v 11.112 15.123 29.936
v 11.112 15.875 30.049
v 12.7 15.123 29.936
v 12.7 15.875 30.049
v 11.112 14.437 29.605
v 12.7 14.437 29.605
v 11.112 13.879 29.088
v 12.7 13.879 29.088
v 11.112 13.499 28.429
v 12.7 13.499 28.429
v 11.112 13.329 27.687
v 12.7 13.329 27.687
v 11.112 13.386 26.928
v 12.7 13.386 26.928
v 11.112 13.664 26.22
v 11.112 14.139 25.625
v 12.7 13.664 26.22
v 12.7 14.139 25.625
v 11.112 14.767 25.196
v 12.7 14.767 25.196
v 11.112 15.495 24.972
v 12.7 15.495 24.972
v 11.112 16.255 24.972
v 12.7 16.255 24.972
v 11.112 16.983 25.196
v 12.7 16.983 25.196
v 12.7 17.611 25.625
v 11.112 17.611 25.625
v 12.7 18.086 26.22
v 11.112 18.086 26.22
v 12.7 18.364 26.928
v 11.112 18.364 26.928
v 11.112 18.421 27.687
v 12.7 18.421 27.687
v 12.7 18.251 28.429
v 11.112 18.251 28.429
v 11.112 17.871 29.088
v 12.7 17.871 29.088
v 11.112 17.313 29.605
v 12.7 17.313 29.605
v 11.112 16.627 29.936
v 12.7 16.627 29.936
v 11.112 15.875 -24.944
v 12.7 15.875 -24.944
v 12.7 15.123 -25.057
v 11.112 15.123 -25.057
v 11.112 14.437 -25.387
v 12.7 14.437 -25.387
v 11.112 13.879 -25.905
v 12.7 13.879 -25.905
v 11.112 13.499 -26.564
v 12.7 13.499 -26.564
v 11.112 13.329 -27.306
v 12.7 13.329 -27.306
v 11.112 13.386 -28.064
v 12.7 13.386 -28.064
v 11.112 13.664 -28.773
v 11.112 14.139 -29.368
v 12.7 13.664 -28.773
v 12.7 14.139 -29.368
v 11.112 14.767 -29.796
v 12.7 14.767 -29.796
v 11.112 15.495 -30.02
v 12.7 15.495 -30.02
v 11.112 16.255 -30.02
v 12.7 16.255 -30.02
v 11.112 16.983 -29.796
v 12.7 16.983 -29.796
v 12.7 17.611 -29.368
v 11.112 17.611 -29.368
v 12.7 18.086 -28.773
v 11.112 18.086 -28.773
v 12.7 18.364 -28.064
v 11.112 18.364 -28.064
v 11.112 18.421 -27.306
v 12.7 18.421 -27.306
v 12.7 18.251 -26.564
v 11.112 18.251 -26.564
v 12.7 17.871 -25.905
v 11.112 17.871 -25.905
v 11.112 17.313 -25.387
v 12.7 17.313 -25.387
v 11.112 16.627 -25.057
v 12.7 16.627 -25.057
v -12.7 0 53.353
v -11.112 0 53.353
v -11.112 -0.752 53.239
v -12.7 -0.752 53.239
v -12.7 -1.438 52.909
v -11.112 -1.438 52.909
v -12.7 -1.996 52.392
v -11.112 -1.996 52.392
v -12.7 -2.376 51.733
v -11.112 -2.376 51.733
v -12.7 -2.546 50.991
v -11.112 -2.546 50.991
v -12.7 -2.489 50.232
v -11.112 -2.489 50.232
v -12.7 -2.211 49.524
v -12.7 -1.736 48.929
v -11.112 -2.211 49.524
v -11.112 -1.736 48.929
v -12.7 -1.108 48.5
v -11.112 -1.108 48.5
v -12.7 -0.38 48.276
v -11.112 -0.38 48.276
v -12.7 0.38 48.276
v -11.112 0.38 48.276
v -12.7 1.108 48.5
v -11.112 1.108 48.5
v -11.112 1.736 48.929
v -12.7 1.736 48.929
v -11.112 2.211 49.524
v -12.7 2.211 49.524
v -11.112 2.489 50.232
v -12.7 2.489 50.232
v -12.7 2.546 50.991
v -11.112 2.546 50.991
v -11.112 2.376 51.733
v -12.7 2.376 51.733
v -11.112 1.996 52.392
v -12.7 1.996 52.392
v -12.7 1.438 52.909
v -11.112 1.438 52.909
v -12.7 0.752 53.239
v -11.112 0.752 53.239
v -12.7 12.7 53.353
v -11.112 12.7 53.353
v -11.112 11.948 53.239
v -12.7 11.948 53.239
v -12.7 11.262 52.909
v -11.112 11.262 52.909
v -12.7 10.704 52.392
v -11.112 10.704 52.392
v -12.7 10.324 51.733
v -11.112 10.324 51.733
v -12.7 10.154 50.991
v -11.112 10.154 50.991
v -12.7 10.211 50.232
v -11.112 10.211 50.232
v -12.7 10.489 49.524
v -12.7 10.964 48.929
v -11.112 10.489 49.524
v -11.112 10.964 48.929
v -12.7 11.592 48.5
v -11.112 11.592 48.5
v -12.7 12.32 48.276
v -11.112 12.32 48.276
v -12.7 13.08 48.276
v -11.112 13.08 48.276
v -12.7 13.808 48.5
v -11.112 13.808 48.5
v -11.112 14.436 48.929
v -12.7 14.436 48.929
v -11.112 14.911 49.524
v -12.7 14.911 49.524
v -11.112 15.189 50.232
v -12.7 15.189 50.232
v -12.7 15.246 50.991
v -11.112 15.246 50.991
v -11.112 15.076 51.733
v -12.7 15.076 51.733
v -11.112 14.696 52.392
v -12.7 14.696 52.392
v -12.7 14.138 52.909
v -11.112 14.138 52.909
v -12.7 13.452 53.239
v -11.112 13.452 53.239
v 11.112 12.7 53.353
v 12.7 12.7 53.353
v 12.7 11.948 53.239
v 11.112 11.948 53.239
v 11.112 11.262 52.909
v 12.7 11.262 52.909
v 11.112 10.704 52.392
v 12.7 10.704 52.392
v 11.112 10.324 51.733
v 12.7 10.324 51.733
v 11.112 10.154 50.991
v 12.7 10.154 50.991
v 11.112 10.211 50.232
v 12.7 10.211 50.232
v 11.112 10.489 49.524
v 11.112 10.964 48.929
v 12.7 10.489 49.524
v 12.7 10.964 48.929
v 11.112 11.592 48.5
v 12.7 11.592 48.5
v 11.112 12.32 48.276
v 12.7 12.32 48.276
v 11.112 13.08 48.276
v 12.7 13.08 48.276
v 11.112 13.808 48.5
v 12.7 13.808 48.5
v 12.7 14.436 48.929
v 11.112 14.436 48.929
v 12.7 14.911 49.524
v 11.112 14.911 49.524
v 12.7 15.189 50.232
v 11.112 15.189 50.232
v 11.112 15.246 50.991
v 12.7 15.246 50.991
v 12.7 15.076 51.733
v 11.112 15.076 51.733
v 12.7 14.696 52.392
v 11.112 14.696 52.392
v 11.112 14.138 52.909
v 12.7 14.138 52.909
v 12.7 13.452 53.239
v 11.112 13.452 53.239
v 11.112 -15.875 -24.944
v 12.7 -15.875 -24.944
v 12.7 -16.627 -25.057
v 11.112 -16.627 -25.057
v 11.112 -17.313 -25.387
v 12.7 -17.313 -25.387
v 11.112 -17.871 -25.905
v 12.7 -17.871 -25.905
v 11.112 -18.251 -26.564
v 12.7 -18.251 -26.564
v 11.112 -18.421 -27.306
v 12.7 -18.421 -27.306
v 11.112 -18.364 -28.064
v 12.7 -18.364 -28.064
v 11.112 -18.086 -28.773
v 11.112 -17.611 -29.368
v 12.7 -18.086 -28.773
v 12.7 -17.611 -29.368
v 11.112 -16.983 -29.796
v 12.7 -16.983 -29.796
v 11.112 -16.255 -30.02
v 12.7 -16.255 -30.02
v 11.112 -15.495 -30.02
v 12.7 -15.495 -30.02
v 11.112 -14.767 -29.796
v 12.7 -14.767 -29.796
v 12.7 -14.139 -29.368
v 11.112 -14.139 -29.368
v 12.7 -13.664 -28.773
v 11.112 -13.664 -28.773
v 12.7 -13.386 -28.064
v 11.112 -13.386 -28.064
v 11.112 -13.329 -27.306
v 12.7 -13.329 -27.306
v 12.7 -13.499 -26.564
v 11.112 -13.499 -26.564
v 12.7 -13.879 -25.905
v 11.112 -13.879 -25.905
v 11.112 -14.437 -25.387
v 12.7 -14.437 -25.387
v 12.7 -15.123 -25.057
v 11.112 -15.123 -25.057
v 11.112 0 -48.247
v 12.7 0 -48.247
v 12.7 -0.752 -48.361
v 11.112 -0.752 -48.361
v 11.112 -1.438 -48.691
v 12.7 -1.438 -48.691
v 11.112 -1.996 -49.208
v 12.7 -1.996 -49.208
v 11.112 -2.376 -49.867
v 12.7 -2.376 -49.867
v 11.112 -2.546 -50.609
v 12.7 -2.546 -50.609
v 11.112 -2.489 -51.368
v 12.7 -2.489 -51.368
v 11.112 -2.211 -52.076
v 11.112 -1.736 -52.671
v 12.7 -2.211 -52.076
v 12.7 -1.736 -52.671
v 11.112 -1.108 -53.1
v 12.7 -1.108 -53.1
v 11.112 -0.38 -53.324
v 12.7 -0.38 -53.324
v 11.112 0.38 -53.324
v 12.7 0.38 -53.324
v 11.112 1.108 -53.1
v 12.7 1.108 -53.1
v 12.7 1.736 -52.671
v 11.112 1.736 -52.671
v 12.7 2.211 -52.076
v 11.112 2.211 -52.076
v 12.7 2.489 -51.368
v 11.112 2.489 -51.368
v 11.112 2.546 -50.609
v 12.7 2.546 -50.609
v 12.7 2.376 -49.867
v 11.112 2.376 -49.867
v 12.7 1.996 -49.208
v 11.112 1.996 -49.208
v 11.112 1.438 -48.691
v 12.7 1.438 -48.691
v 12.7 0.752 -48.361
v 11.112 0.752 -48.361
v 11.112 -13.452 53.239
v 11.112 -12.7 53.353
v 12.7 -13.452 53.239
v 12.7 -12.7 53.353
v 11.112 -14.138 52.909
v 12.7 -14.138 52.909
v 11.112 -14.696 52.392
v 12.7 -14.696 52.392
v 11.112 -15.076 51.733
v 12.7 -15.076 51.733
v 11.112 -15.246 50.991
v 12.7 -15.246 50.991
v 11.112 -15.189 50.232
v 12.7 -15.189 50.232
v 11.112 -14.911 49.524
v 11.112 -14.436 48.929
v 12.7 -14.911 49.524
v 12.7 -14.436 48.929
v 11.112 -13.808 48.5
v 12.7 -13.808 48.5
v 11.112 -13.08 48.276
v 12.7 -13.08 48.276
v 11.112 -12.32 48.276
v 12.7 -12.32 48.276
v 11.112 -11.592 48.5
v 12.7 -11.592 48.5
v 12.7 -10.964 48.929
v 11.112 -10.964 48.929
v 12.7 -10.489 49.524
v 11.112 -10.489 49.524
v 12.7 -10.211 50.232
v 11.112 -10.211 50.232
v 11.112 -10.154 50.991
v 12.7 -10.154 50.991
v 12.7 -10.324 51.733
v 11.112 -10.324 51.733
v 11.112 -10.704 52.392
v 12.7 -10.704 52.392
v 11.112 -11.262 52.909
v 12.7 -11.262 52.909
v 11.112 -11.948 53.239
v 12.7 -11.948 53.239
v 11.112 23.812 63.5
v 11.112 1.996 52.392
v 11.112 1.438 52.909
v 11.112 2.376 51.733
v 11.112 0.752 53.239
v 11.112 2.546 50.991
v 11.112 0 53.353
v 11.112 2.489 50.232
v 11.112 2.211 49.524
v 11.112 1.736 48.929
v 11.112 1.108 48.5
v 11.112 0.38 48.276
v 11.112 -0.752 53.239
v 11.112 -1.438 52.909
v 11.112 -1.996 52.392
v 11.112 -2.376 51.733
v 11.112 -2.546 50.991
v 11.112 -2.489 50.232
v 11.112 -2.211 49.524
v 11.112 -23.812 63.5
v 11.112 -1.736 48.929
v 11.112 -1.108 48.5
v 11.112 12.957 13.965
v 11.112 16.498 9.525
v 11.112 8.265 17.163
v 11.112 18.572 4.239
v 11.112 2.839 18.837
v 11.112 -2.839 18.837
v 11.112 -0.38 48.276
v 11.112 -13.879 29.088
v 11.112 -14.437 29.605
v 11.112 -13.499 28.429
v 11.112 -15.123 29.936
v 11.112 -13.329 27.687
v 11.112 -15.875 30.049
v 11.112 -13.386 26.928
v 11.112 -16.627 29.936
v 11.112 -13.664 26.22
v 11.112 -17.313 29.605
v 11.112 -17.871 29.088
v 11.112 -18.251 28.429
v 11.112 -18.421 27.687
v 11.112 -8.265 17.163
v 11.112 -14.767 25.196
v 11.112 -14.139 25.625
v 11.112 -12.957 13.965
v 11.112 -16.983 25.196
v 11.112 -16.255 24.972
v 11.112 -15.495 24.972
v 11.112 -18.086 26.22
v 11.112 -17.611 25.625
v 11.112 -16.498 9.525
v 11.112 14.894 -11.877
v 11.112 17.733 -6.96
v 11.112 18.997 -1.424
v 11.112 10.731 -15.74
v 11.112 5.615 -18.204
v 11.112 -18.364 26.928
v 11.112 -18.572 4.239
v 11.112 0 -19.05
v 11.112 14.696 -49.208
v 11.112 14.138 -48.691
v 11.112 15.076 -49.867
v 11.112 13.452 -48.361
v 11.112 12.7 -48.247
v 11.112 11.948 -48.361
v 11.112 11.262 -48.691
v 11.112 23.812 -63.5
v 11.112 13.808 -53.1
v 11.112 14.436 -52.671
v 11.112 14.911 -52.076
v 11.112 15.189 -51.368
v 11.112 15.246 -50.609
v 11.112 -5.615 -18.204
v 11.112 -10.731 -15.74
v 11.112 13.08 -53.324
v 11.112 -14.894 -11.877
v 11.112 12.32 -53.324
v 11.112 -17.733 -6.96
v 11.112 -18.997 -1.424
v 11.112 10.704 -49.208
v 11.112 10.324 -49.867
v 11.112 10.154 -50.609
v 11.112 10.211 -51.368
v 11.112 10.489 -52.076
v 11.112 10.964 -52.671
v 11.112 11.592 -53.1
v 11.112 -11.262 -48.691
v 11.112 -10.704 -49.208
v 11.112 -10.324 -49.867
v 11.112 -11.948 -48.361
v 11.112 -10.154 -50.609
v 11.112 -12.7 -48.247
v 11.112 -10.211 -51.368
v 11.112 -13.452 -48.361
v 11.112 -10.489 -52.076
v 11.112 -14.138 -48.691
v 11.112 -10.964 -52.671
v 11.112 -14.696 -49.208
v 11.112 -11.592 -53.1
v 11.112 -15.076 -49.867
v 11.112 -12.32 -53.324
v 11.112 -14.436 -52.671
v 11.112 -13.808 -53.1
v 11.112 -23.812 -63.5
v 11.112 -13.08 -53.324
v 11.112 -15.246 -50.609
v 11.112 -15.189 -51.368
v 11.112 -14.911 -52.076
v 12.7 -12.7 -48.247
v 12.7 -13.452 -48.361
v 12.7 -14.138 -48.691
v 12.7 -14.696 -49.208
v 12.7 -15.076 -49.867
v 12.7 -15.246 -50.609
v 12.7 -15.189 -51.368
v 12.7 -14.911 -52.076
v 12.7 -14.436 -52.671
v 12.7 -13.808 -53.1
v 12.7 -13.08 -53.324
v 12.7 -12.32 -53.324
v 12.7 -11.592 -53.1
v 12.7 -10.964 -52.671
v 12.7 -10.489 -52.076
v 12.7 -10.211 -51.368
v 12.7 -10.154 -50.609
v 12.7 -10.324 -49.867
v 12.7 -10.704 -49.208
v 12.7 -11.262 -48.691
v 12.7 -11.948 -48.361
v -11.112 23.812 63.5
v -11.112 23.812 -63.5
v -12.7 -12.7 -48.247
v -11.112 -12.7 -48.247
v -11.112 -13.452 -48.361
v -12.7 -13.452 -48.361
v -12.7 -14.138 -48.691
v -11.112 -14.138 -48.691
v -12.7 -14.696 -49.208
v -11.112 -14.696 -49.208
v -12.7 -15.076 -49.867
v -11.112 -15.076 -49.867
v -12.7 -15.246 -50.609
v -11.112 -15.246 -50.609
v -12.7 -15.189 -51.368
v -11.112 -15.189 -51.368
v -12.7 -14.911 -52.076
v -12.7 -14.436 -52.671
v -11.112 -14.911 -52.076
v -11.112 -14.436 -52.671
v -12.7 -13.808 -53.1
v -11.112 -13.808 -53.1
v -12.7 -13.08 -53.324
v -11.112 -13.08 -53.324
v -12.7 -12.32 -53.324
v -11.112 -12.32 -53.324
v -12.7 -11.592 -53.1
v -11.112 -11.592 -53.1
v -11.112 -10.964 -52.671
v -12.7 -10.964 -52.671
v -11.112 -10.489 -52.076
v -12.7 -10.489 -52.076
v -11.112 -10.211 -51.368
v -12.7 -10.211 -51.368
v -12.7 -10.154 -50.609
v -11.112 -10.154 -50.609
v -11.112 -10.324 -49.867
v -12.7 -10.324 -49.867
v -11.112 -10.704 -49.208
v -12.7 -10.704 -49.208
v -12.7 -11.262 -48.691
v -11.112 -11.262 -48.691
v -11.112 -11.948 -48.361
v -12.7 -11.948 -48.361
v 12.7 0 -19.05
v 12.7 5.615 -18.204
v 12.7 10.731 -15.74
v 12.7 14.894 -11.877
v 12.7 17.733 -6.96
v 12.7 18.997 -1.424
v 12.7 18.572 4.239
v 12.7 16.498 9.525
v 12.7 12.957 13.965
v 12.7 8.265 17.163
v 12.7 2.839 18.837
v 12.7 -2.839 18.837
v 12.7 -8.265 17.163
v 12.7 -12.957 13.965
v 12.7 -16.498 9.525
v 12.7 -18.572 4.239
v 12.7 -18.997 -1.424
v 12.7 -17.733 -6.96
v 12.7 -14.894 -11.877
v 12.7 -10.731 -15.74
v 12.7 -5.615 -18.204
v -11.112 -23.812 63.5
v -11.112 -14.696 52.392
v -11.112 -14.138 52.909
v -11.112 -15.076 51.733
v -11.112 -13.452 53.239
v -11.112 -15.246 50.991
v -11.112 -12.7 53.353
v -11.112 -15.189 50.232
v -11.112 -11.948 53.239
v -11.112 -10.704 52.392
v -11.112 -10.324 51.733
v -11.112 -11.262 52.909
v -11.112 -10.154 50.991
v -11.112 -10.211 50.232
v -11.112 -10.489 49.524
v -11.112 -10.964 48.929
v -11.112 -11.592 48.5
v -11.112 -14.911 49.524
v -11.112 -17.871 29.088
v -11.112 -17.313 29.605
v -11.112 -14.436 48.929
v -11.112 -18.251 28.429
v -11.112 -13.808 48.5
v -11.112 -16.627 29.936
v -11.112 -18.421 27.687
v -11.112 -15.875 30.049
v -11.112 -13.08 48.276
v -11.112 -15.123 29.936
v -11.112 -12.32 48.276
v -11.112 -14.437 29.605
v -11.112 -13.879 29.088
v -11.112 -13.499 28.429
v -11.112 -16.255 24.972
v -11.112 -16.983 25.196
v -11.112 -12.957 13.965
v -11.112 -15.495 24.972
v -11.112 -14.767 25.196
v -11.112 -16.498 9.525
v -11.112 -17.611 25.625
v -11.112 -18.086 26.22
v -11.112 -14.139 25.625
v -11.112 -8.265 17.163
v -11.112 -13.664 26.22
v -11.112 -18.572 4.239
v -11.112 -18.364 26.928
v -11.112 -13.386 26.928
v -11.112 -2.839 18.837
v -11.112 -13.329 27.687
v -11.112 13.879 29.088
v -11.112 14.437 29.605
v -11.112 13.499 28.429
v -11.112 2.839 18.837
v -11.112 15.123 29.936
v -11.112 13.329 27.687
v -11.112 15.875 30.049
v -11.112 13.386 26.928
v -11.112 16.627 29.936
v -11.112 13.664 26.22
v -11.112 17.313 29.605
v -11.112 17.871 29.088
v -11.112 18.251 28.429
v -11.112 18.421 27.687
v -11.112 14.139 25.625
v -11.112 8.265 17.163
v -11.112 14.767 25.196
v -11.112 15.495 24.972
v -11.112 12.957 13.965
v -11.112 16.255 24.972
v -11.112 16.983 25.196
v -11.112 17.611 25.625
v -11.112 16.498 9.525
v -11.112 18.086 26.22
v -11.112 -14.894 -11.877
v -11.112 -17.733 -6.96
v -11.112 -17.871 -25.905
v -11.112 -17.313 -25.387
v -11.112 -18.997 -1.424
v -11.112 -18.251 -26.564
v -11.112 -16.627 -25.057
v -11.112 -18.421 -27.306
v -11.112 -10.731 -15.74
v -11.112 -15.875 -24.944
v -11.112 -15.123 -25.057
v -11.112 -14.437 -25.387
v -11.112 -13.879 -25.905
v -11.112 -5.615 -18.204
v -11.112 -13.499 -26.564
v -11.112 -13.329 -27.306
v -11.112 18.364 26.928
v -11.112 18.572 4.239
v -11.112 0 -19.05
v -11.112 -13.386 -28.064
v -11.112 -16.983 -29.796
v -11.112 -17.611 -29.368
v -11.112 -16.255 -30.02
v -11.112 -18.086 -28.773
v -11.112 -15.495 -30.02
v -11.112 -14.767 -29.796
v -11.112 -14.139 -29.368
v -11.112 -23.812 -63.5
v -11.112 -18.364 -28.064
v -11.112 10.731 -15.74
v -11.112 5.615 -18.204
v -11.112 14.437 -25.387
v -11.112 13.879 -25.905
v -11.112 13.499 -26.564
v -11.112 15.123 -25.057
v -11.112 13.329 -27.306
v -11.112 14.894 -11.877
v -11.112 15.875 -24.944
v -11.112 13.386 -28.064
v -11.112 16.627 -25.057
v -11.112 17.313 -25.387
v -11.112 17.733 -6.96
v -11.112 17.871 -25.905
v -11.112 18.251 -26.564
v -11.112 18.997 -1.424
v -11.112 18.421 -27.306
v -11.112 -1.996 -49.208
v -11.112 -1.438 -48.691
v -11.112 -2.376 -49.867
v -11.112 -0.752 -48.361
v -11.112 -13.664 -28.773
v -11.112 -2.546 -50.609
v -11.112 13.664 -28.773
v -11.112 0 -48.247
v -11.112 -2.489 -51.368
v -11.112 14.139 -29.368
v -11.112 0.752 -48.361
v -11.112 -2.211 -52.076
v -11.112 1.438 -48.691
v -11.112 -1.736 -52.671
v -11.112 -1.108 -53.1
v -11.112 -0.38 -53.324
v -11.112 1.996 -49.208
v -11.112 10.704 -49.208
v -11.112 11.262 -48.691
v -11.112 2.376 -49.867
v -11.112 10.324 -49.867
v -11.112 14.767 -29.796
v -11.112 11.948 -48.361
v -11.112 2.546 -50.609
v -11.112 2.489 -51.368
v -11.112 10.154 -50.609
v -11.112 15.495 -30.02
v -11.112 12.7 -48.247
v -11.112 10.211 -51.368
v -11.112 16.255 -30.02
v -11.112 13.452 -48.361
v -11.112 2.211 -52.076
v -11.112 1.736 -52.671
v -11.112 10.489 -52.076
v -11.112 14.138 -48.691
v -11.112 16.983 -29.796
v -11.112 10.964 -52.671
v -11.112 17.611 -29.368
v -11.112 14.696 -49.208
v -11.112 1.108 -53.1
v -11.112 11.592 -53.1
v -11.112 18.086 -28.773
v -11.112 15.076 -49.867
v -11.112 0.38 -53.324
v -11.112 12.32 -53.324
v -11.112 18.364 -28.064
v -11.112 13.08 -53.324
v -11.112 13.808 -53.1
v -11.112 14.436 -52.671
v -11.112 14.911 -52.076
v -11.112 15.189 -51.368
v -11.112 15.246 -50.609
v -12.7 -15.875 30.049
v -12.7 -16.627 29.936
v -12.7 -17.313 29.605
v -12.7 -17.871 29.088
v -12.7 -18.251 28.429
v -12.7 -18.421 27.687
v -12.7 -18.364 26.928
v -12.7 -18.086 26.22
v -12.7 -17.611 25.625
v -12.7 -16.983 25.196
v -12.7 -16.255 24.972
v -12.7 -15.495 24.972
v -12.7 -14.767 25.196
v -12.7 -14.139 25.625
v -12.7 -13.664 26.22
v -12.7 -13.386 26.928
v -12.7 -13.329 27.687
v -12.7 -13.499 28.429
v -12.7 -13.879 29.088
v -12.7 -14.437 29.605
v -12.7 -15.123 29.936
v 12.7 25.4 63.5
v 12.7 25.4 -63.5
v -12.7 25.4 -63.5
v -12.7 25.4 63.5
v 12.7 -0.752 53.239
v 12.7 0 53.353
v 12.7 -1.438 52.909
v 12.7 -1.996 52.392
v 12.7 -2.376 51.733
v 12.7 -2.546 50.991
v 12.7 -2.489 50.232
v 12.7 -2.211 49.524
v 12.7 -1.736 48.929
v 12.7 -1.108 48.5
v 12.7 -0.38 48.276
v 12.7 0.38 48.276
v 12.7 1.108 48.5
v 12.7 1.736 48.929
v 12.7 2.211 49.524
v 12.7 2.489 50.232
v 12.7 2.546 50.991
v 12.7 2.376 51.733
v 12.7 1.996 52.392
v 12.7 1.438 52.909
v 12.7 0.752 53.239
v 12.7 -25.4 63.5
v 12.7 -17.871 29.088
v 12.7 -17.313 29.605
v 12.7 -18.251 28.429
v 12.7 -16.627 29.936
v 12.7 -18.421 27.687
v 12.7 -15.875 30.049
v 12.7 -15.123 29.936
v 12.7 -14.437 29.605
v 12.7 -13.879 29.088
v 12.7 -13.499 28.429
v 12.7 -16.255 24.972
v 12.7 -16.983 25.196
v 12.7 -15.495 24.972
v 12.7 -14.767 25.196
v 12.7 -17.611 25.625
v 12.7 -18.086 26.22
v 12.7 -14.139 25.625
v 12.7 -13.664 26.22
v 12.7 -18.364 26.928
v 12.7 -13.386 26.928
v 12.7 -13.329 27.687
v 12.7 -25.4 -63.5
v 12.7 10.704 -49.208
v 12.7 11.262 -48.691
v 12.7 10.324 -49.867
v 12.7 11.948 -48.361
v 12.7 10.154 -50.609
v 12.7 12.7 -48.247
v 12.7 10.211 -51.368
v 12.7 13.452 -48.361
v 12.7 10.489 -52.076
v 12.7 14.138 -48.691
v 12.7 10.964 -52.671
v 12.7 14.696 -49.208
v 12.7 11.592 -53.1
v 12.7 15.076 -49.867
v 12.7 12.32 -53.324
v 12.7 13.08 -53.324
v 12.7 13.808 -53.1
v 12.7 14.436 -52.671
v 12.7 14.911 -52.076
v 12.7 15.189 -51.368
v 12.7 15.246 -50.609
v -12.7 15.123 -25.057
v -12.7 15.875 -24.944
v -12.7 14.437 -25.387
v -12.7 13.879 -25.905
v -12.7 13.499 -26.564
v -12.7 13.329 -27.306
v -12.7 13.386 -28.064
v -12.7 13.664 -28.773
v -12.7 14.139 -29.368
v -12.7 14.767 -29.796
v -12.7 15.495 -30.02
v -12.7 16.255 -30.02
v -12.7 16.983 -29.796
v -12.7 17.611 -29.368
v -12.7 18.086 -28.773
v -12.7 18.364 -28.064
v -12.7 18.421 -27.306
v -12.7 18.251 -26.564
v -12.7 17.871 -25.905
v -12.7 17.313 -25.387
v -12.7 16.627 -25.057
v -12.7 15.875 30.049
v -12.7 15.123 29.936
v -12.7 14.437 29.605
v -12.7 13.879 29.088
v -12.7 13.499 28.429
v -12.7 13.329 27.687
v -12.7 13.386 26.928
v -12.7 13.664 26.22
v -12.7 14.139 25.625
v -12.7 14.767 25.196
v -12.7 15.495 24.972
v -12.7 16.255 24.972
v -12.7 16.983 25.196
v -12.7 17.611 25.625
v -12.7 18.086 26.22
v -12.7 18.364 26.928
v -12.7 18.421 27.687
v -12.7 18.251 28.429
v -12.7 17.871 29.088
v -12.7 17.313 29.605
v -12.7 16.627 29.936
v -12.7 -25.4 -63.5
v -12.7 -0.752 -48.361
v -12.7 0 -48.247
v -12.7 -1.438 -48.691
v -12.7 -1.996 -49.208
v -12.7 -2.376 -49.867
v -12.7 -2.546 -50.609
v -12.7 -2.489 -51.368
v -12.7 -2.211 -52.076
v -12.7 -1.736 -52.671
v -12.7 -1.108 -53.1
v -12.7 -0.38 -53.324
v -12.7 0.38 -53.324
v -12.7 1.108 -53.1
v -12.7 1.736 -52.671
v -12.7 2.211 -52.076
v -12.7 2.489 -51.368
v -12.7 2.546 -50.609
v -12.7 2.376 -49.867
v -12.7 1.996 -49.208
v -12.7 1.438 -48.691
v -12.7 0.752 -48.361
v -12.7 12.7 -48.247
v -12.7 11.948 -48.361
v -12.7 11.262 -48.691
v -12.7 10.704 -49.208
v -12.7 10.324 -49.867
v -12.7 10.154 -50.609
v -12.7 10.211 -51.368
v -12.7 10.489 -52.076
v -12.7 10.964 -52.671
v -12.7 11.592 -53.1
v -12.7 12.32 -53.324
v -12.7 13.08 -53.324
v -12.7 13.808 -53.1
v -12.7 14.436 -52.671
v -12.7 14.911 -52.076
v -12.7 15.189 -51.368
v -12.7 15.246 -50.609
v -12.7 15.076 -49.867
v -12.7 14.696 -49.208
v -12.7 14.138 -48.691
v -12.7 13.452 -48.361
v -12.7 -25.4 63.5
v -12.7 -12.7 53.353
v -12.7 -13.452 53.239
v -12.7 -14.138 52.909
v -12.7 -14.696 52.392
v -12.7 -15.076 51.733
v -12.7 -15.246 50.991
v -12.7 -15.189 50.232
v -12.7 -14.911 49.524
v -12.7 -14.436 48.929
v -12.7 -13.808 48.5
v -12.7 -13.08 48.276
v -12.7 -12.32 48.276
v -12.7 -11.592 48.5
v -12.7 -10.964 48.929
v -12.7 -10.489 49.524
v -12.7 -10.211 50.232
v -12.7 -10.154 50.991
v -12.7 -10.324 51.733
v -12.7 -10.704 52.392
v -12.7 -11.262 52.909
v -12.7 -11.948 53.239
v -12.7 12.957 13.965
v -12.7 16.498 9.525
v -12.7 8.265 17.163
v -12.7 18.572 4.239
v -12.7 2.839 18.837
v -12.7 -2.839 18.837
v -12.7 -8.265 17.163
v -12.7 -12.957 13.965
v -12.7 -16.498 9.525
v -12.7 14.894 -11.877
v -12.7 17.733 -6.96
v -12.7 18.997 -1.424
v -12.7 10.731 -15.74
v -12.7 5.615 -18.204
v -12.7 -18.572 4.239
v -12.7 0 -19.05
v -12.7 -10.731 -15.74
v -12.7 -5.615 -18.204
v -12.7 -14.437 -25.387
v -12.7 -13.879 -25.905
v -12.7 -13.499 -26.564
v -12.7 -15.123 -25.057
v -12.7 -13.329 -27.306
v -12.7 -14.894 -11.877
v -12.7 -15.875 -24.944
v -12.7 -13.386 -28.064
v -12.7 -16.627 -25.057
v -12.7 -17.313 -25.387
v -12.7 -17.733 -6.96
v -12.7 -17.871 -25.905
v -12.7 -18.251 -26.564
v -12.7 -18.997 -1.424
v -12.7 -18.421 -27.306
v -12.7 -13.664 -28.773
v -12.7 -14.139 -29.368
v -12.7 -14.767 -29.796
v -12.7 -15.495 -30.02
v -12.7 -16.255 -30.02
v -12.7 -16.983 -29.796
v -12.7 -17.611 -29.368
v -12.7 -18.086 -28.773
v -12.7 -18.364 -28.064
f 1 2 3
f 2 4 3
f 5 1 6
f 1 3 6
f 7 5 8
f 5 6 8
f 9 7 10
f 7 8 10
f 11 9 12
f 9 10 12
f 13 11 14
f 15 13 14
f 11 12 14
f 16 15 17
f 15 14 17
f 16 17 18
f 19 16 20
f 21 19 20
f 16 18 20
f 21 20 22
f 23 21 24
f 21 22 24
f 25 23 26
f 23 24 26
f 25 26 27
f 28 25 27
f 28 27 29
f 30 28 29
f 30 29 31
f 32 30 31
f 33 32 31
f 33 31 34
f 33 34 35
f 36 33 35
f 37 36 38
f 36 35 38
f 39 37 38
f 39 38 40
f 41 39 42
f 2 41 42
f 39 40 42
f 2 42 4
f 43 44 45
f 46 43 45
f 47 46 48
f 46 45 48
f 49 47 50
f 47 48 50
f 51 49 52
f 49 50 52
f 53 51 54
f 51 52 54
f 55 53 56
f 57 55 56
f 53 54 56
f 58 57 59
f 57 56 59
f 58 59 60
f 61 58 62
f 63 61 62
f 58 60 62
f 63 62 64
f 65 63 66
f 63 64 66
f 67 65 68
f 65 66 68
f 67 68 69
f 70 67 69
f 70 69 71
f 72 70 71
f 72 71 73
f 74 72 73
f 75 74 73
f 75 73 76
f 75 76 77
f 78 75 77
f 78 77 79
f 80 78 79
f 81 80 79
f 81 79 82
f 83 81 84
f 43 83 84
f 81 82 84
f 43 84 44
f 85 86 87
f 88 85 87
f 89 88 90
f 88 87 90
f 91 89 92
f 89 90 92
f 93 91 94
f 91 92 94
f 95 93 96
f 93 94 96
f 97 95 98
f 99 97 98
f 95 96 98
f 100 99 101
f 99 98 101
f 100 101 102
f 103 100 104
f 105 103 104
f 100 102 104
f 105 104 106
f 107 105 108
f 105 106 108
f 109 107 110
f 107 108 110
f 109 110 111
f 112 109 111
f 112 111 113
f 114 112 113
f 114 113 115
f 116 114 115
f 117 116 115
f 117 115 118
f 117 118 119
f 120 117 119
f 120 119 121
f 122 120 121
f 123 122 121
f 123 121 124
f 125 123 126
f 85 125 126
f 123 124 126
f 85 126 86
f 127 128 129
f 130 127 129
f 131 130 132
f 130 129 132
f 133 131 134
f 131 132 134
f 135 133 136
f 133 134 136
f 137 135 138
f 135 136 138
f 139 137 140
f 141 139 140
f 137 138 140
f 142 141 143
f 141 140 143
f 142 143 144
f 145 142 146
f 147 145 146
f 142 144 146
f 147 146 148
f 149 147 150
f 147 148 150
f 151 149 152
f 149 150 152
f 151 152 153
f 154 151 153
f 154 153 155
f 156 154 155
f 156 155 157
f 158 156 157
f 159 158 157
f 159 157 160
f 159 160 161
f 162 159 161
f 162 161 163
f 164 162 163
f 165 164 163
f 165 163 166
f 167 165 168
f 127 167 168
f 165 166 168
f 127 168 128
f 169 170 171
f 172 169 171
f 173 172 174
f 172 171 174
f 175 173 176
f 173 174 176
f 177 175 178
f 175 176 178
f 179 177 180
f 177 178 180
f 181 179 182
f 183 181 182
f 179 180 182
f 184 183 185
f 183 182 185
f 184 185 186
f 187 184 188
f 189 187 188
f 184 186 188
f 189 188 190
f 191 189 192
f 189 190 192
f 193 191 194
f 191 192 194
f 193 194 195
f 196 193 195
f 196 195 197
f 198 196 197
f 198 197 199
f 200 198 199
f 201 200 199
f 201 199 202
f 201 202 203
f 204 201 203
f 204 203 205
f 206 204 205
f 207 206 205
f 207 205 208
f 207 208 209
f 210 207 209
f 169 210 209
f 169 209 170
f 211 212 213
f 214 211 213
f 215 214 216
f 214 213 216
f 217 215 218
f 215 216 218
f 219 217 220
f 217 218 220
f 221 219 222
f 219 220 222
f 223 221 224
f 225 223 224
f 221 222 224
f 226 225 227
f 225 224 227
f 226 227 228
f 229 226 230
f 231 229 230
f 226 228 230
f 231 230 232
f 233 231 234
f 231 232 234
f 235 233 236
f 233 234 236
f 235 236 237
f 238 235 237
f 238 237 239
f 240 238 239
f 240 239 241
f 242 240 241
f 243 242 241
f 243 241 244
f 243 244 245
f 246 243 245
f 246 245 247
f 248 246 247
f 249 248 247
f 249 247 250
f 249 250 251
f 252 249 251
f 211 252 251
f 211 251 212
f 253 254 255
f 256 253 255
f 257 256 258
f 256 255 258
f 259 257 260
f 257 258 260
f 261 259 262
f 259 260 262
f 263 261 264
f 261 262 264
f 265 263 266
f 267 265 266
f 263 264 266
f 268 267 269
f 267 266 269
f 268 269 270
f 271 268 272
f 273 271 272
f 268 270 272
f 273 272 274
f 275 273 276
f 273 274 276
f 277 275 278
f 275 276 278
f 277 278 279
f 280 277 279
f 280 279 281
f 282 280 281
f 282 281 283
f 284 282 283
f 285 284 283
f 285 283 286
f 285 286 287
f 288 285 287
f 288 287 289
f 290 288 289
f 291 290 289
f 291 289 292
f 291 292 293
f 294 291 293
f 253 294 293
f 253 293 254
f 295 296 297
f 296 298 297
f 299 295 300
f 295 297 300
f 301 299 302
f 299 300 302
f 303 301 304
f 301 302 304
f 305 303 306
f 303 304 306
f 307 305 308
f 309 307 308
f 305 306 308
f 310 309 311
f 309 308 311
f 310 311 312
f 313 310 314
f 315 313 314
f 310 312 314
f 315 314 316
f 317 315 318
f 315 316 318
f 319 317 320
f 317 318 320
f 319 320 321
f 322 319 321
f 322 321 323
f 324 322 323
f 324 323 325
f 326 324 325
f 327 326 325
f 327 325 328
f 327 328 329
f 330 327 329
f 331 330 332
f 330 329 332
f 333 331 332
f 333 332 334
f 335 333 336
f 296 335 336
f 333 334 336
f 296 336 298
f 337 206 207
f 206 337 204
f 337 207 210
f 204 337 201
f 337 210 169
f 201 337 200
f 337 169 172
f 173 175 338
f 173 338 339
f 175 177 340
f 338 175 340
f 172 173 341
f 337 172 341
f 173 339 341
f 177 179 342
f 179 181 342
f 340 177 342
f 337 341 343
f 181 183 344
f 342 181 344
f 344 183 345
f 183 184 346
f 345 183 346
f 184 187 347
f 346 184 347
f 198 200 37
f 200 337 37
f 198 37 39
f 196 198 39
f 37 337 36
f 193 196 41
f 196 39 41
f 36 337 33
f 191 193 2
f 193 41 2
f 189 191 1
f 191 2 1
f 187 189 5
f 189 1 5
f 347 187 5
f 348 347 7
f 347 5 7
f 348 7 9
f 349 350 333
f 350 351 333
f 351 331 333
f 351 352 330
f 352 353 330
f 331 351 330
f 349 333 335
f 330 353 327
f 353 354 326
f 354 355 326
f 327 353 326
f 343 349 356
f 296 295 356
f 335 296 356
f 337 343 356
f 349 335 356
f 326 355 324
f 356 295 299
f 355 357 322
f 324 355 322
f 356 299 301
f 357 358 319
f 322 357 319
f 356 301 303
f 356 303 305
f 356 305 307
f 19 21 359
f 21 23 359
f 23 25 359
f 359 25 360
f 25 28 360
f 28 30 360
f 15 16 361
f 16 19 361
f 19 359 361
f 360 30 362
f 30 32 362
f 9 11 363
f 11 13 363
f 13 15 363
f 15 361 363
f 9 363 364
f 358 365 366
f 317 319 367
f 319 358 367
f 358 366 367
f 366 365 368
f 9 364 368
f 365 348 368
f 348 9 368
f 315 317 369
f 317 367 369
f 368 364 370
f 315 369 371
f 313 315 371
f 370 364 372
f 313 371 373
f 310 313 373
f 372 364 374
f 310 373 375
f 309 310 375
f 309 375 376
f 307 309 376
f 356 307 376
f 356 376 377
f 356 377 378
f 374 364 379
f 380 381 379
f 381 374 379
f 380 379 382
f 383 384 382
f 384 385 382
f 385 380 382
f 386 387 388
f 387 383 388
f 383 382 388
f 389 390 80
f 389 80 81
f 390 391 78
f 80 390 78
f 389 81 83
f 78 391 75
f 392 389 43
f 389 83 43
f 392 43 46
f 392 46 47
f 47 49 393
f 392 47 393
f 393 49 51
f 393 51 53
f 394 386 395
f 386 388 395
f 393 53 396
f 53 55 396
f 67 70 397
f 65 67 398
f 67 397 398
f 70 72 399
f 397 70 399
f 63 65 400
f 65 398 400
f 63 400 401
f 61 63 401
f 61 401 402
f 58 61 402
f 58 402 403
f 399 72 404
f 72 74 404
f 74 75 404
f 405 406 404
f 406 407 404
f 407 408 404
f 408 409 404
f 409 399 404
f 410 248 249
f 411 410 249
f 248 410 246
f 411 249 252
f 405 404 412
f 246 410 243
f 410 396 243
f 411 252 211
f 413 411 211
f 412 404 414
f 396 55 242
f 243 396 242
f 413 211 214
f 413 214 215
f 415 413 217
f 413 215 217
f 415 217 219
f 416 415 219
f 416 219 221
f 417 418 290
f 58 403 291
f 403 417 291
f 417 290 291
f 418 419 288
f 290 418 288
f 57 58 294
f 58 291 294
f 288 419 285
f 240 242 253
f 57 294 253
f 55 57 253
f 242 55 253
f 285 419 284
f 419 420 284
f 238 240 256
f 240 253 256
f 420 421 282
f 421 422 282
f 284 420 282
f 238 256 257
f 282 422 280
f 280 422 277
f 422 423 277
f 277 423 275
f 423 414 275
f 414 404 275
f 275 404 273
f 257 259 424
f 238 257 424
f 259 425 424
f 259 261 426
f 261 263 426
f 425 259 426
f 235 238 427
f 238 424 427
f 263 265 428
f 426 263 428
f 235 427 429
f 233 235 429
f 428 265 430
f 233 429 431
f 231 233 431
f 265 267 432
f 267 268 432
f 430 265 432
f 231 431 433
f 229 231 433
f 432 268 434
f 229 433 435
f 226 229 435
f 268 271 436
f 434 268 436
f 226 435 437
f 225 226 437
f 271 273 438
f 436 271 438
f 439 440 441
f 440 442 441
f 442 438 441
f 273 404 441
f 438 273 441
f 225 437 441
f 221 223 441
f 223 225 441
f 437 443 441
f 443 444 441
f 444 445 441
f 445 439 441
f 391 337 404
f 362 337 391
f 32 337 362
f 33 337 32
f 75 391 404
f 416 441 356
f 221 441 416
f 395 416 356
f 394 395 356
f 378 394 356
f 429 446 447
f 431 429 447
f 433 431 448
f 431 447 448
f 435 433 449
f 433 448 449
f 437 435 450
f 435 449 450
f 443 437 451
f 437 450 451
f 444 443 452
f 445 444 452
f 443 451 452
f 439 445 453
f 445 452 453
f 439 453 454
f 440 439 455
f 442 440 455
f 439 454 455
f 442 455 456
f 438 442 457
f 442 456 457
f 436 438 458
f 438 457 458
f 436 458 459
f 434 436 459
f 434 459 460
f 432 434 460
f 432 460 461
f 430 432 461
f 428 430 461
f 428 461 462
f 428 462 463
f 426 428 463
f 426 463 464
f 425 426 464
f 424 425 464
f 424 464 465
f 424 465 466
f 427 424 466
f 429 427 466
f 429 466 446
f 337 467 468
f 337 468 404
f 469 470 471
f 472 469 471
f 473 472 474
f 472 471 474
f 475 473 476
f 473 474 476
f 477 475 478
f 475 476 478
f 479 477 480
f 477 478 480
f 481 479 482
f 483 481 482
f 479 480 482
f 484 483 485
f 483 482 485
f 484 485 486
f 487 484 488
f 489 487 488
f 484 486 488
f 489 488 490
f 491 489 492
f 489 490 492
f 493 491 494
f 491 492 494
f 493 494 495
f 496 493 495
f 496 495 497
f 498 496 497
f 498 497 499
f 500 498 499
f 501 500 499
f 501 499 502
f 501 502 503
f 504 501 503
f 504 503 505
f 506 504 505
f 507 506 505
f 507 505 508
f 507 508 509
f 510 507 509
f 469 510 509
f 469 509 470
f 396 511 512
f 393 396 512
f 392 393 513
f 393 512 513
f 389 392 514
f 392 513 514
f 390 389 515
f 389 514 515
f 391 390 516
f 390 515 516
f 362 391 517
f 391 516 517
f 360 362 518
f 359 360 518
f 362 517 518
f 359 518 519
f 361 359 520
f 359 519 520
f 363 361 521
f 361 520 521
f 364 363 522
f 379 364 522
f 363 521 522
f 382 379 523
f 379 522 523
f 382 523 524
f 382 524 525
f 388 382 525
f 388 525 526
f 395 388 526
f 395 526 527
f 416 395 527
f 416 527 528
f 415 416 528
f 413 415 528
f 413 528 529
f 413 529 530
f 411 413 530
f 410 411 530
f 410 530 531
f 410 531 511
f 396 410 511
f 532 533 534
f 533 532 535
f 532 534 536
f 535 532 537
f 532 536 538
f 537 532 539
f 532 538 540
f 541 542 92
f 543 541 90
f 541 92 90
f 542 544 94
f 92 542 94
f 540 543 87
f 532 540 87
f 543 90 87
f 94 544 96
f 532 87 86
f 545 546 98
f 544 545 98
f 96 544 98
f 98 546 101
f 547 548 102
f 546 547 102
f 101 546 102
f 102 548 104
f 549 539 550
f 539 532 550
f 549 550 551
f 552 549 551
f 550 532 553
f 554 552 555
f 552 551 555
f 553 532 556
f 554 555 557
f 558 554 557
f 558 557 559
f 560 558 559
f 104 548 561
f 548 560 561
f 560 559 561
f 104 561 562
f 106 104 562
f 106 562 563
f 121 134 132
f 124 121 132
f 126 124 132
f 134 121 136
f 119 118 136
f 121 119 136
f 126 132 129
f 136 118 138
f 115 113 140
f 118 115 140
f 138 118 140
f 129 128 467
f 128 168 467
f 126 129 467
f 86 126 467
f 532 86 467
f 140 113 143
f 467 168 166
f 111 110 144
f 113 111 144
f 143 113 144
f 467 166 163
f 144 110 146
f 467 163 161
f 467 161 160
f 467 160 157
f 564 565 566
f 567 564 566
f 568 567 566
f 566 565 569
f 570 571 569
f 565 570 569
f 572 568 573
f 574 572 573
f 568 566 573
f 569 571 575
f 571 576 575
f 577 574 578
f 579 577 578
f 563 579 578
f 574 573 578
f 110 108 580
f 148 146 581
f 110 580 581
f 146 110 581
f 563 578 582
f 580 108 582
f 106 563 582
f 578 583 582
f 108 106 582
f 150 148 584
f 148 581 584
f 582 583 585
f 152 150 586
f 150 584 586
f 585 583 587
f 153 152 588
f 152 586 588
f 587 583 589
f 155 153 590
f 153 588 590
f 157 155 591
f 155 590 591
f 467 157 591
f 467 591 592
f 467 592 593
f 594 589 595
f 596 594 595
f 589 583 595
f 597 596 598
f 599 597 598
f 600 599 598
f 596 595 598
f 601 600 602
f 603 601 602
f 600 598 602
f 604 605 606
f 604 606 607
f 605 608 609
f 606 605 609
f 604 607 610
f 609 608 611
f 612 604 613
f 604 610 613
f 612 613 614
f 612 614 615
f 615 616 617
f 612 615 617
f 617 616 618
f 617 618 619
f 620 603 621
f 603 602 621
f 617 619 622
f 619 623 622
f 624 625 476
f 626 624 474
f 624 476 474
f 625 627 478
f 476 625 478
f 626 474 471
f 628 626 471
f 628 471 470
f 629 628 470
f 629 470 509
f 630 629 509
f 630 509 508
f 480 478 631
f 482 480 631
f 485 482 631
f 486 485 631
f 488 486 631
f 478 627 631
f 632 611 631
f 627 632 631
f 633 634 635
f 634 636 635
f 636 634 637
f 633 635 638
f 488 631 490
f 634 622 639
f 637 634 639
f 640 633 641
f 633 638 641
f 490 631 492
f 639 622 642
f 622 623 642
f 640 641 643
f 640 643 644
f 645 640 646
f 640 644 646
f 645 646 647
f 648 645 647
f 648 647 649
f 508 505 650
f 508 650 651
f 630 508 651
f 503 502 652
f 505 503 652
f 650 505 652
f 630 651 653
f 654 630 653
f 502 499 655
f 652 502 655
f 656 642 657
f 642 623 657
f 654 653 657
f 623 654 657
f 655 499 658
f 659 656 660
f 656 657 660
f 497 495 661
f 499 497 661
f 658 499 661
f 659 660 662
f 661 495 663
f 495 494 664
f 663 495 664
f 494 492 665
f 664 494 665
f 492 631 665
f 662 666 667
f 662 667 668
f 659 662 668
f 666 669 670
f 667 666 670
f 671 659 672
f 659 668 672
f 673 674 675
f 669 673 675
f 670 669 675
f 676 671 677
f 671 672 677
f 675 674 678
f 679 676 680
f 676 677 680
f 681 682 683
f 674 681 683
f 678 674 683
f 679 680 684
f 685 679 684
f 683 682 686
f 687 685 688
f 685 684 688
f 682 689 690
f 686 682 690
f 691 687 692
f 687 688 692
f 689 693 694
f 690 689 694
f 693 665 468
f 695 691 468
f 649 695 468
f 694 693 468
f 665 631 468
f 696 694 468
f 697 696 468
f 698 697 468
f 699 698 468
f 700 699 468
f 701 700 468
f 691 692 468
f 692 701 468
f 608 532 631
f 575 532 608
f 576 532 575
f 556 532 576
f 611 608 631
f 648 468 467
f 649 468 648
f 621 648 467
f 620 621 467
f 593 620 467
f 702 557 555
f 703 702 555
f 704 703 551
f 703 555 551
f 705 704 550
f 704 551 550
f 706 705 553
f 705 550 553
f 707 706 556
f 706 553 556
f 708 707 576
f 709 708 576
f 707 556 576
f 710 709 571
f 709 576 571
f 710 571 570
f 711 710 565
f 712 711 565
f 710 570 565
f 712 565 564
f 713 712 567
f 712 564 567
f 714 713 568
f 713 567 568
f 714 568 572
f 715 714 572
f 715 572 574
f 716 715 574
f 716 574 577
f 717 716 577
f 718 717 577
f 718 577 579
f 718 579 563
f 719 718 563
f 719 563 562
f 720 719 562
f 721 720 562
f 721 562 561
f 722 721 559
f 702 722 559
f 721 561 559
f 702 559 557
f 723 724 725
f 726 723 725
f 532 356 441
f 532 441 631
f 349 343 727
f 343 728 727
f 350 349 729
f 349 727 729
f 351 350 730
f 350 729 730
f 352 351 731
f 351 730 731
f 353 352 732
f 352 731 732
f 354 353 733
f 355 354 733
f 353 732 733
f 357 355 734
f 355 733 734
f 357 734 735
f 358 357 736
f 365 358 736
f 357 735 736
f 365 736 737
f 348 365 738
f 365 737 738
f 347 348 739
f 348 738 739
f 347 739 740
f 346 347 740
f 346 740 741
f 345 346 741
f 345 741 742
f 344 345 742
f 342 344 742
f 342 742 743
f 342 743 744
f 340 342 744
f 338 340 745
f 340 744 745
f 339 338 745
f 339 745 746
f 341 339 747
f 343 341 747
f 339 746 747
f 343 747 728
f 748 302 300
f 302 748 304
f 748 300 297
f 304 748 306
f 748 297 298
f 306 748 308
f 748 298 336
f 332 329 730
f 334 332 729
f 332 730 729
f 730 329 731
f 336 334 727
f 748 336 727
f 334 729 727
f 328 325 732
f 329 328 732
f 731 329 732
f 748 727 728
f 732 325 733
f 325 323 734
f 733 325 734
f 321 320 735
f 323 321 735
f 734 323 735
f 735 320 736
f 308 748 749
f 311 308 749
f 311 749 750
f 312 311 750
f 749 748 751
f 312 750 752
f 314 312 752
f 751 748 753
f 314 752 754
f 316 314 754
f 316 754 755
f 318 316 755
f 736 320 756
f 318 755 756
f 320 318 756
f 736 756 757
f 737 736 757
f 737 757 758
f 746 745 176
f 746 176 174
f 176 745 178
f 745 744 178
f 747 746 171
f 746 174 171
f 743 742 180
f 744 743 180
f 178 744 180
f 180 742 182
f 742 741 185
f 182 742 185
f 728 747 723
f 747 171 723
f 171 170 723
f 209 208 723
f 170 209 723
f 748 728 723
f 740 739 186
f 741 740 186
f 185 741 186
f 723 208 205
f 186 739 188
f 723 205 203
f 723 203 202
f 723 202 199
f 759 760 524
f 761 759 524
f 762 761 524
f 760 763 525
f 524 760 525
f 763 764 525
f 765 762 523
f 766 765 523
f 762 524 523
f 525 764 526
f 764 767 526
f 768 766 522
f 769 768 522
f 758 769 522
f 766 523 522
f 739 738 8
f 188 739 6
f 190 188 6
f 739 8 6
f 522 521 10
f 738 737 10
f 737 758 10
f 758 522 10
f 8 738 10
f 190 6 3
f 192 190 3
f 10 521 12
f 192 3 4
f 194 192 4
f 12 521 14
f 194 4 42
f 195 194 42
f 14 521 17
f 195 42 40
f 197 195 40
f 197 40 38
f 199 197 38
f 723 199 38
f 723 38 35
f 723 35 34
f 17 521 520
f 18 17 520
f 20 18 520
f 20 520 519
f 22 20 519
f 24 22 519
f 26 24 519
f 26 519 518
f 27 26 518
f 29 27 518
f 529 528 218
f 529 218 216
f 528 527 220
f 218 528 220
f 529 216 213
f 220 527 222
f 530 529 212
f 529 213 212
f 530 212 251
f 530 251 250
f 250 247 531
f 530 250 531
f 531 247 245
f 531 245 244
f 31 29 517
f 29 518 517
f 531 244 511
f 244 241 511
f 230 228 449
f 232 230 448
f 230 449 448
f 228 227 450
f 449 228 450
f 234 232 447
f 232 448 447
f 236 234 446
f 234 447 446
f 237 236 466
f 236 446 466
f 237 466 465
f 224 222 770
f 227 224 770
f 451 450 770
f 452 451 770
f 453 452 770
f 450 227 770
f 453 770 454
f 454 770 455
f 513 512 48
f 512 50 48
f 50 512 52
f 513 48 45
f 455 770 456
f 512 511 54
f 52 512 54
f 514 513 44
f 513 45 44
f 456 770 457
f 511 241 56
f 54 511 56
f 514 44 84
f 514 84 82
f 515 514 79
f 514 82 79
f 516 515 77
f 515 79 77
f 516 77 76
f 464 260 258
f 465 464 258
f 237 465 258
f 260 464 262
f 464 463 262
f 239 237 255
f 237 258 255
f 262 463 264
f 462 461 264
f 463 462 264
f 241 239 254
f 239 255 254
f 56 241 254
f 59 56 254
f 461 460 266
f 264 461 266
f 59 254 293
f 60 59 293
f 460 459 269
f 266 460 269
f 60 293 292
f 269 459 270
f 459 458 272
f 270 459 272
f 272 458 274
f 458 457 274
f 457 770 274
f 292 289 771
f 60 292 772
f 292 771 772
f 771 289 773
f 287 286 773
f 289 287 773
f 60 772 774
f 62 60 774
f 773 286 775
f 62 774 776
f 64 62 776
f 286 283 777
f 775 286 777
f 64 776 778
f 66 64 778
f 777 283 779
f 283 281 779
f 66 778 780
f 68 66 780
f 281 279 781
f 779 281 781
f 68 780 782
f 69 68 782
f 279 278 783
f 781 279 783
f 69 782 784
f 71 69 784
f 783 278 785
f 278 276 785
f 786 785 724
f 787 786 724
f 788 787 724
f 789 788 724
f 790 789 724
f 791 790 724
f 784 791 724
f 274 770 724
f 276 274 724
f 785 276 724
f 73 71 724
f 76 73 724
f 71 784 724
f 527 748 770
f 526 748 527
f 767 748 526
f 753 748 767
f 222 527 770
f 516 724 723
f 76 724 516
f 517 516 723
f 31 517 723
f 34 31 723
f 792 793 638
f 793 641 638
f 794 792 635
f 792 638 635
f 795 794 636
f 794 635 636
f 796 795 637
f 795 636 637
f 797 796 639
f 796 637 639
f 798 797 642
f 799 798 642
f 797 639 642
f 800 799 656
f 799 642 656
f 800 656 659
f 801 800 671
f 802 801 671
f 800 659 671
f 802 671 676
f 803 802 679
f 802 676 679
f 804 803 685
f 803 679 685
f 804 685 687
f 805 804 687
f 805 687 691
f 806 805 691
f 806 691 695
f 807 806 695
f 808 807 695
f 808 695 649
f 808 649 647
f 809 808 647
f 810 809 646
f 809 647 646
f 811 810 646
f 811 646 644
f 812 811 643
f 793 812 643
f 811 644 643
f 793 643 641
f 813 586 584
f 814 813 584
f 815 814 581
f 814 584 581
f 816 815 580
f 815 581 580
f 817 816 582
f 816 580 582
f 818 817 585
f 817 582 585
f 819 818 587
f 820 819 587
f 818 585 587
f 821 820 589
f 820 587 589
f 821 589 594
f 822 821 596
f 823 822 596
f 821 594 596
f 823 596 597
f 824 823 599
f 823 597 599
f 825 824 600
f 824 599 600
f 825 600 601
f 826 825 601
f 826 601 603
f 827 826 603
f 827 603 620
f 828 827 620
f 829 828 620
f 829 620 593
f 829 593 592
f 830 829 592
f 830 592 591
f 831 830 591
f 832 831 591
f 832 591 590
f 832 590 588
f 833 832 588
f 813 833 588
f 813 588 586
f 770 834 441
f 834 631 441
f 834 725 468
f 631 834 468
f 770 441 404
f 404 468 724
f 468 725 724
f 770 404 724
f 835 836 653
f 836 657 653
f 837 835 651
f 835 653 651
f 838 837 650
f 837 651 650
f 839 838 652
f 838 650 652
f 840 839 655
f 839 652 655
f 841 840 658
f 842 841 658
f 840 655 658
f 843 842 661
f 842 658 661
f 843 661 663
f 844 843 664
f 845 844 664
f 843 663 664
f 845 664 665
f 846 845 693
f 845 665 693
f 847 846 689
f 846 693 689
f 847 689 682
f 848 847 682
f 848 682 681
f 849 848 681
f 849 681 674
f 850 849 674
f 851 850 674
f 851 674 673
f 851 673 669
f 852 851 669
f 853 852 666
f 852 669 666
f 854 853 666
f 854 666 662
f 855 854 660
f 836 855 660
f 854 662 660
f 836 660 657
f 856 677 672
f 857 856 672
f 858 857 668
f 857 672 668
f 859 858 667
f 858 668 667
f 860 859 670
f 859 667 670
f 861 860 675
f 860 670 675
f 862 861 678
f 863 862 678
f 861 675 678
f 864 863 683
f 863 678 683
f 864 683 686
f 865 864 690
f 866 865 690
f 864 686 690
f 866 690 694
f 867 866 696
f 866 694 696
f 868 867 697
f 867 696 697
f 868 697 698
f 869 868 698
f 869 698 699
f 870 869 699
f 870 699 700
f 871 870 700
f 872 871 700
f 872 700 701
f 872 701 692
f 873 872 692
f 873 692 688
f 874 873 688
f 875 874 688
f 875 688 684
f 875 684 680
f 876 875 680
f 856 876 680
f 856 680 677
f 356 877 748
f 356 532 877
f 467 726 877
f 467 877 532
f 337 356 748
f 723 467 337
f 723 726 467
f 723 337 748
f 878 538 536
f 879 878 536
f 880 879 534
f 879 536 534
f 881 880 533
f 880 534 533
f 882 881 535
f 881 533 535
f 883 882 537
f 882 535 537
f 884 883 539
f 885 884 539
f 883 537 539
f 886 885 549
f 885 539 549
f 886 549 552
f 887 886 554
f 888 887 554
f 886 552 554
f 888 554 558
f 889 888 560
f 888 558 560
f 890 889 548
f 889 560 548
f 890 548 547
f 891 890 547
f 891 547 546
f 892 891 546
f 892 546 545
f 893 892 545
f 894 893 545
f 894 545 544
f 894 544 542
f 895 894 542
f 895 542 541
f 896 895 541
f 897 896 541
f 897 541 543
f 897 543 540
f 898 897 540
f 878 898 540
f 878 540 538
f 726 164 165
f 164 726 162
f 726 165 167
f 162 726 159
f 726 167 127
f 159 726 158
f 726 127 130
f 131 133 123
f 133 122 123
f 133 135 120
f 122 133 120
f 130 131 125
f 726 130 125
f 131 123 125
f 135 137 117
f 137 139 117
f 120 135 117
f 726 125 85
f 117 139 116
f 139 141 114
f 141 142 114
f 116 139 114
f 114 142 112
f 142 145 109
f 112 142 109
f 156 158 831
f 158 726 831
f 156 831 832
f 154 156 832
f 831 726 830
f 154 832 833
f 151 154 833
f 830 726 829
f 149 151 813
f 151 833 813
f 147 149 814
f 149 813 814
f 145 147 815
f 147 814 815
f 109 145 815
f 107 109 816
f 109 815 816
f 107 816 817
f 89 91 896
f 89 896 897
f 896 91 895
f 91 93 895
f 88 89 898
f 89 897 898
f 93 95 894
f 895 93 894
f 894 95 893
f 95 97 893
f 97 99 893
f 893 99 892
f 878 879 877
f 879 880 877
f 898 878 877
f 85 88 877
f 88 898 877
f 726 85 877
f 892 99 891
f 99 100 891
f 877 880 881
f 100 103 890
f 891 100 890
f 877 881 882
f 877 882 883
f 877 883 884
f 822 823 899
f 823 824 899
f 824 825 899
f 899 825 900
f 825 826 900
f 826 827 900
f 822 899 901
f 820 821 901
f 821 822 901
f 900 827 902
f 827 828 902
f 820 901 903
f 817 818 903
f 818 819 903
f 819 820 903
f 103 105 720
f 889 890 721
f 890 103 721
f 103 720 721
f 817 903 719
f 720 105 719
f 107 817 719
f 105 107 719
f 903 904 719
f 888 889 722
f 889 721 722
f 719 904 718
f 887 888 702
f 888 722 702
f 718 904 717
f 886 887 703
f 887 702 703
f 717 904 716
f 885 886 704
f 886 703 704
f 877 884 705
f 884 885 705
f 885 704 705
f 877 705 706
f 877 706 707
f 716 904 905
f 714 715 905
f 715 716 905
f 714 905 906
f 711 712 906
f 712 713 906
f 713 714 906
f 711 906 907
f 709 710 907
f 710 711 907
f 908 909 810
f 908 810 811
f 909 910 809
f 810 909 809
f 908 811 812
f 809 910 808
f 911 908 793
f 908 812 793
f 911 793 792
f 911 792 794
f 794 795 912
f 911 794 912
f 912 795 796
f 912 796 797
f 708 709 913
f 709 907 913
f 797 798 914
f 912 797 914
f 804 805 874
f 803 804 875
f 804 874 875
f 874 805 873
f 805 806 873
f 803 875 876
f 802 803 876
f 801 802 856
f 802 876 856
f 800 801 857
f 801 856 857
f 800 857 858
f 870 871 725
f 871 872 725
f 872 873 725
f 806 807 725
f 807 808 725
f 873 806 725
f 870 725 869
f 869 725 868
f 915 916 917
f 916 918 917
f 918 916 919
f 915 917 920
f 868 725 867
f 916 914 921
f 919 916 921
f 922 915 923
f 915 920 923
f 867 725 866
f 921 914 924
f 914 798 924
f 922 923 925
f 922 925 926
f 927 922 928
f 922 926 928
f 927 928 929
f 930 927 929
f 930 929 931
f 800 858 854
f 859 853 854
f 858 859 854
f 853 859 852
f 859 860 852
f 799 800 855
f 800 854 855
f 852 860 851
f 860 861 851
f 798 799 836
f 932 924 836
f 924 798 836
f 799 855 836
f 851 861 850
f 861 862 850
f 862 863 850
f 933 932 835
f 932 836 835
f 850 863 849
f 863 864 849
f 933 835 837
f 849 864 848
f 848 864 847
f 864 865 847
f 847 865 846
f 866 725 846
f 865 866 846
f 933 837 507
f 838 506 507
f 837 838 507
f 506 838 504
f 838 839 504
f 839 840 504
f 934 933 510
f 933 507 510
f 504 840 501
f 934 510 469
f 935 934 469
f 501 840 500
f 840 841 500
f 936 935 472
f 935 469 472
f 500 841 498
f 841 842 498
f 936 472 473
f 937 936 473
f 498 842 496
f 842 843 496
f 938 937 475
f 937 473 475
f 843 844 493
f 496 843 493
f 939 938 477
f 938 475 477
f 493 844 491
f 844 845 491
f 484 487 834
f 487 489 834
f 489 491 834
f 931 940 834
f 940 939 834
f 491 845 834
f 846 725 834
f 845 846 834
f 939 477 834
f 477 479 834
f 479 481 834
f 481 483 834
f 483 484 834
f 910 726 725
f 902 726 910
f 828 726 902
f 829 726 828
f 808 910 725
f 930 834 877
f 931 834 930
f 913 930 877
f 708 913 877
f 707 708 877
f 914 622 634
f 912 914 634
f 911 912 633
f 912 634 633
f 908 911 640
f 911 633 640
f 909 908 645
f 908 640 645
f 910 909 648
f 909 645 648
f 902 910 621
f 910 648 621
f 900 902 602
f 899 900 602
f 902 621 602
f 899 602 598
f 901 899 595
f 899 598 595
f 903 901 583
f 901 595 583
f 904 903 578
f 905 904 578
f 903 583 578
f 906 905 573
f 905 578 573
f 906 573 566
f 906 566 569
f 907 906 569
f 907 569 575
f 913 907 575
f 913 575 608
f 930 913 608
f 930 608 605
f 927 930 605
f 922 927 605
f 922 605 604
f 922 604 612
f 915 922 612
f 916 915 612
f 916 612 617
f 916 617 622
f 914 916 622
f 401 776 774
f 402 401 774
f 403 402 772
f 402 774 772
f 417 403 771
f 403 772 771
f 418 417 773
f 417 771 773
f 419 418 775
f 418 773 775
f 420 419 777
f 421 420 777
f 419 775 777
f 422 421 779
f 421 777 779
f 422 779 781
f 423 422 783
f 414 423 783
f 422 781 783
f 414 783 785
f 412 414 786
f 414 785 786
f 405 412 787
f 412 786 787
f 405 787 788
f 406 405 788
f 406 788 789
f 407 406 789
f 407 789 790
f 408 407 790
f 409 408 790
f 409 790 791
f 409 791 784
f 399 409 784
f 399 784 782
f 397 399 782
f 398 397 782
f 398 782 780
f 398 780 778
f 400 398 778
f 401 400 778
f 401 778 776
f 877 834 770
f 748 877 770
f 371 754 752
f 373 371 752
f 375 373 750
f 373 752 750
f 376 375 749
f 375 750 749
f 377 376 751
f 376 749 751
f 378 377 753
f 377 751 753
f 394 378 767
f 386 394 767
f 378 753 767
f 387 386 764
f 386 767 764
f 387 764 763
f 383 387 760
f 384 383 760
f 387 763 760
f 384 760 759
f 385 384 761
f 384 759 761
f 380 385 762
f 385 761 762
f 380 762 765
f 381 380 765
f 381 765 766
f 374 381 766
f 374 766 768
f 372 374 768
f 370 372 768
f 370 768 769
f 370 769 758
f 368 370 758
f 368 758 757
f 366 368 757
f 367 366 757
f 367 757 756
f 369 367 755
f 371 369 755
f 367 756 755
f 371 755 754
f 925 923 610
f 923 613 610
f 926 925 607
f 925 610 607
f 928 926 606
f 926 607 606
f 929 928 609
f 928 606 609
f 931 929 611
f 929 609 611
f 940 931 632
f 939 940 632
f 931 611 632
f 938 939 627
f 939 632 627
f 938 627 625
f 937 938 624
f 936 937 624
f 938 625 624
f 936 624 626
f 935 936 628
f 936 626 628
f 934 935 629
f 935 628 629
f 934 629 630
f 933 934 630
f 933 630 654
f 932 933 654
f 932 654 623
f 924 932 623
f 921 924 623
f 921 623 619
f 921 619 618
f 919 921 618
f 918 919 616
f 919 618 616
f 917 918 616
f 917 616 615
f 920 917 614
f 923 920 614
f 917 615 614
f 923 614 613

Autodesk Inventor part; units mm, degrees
ref_plane "YZ Plane" through (0, 0, 0) normal (1, 0, 0) x (0, 1, 0)
ref_plane "XZ Plane" through (0, 0, 0) normal (0, 1, 0) x (-1, 0, 0)
ref_plane "XY Plane" through (0, 0, 0) normal (0, 0, 1) x (1, 0, 0)
sketch "Sketch1" plane through (0, 0, 0) normal (0, 0, 1) x (1, 0, 0)
  line L0 (-12.7, -25.4) -> (12.7, -25.4)
  line L1 (12.7, -25.4) -> (12.7, 25.4)
  line L2 (12.7, 25.4) -> (-12.7, 25.4)
  line L3 (-12.7, 25.4) -> (-12.7, -25.4)
  line L4 (-12.7, -25.4) -> (12.7, 25.4) construction
  line L5 (12.7, -25.4) -> (-12.7, 25.4) construction
  line L6 (-11.1125, 23.8125) -> (11.1125, 23.8125)
  line L7 (11.1125, 23.8125) -> (11.1125, -23.8125)
  line L8 (11.1125, -23.8125) -> (-11.1125, -23.8125)
  line L9 (-11.1125, -23.8125) -> (-11.1125, 23.8125)
  point P0 (0, 0)
  dimension "width" = 25.4
  dimension "height" = 50.8
  dimension "thickness" = 1.5875
extrude "Extrusion1" add sketch "Sketch1" along normal mid plane 127
sketch "Sketch2" plane through (-12.7, -25.4, 63.5) normal (-1, 0, 0) x (0, 0, 1)
  circle A0 centre (-63.5, 25.4) radius 31.75 construction
  line L0 (-127, 0) -> (-127, 50.8) projected
  line L1 (-63.5, 50.8) -> (-63.5, 0) construction
  line L2 (0, 0) -> (-127, 0) construction
  line L3 (-127, 50.8) -> (0, 50.8) construction
  point P0 (-63.5, 57.15)
  point P1 (-90.9963, 41.275)
  point P2 (-90.9963, 9.525)
  point P3 (-63.5, -6.35)
  point P4 (-36.0037, 9.525)
  point P5 (-36.0037, 41.275)
  point P6 (-114.3, 38.1)
  point P7 (-114.3, 25.4)
  point P8 (-114.3, 12.7)
  point P9 (-12.7, 38.1)
  point P10 (-12.7, 25.4)
  point P11 (-12.7, 12.7)
  dimension "d5" = 63.5
  dimension "d8" = 360
  dimension "d17" = 12.7
  dimension "d18" = 12.7
  dimension "d19" = 12.7
hole "Hole1" at (-12.7, 15.875, -27.4963) at (-12.7, -15.875, -27.4963) at (-12.7, -15.875, 27.4963) at (-12.7, 15.875, 27.4963) at (-12.7, 12.7, -50.8) at (-12.7, 0, -50.8) at (-12.7, -12.7, -50.8) at (-12.7, -12.7, 50.8) at (-12.7, 0, 50.8) at (-12.7, 12.7, 50.8) direction (1, 0, 0) diameter 5.1054 end through all clearance for "Flat Head Machine Screw (82)" size "#10" standard "Ansi Unified Screw Threads"
sketch "Sketch3" plane through (12.7, -25.4, 63.5) normal (1, 0, 0) x (0, 0, -1)
  circle A0 centre (63.5, 25.4) radius 19.05
  dimension "d20" = 38.1
extrude "Extrusion2" cut sketch "Sketch3" against normal through all
properties part number "GP4-002" material "Aluminum 6061"
